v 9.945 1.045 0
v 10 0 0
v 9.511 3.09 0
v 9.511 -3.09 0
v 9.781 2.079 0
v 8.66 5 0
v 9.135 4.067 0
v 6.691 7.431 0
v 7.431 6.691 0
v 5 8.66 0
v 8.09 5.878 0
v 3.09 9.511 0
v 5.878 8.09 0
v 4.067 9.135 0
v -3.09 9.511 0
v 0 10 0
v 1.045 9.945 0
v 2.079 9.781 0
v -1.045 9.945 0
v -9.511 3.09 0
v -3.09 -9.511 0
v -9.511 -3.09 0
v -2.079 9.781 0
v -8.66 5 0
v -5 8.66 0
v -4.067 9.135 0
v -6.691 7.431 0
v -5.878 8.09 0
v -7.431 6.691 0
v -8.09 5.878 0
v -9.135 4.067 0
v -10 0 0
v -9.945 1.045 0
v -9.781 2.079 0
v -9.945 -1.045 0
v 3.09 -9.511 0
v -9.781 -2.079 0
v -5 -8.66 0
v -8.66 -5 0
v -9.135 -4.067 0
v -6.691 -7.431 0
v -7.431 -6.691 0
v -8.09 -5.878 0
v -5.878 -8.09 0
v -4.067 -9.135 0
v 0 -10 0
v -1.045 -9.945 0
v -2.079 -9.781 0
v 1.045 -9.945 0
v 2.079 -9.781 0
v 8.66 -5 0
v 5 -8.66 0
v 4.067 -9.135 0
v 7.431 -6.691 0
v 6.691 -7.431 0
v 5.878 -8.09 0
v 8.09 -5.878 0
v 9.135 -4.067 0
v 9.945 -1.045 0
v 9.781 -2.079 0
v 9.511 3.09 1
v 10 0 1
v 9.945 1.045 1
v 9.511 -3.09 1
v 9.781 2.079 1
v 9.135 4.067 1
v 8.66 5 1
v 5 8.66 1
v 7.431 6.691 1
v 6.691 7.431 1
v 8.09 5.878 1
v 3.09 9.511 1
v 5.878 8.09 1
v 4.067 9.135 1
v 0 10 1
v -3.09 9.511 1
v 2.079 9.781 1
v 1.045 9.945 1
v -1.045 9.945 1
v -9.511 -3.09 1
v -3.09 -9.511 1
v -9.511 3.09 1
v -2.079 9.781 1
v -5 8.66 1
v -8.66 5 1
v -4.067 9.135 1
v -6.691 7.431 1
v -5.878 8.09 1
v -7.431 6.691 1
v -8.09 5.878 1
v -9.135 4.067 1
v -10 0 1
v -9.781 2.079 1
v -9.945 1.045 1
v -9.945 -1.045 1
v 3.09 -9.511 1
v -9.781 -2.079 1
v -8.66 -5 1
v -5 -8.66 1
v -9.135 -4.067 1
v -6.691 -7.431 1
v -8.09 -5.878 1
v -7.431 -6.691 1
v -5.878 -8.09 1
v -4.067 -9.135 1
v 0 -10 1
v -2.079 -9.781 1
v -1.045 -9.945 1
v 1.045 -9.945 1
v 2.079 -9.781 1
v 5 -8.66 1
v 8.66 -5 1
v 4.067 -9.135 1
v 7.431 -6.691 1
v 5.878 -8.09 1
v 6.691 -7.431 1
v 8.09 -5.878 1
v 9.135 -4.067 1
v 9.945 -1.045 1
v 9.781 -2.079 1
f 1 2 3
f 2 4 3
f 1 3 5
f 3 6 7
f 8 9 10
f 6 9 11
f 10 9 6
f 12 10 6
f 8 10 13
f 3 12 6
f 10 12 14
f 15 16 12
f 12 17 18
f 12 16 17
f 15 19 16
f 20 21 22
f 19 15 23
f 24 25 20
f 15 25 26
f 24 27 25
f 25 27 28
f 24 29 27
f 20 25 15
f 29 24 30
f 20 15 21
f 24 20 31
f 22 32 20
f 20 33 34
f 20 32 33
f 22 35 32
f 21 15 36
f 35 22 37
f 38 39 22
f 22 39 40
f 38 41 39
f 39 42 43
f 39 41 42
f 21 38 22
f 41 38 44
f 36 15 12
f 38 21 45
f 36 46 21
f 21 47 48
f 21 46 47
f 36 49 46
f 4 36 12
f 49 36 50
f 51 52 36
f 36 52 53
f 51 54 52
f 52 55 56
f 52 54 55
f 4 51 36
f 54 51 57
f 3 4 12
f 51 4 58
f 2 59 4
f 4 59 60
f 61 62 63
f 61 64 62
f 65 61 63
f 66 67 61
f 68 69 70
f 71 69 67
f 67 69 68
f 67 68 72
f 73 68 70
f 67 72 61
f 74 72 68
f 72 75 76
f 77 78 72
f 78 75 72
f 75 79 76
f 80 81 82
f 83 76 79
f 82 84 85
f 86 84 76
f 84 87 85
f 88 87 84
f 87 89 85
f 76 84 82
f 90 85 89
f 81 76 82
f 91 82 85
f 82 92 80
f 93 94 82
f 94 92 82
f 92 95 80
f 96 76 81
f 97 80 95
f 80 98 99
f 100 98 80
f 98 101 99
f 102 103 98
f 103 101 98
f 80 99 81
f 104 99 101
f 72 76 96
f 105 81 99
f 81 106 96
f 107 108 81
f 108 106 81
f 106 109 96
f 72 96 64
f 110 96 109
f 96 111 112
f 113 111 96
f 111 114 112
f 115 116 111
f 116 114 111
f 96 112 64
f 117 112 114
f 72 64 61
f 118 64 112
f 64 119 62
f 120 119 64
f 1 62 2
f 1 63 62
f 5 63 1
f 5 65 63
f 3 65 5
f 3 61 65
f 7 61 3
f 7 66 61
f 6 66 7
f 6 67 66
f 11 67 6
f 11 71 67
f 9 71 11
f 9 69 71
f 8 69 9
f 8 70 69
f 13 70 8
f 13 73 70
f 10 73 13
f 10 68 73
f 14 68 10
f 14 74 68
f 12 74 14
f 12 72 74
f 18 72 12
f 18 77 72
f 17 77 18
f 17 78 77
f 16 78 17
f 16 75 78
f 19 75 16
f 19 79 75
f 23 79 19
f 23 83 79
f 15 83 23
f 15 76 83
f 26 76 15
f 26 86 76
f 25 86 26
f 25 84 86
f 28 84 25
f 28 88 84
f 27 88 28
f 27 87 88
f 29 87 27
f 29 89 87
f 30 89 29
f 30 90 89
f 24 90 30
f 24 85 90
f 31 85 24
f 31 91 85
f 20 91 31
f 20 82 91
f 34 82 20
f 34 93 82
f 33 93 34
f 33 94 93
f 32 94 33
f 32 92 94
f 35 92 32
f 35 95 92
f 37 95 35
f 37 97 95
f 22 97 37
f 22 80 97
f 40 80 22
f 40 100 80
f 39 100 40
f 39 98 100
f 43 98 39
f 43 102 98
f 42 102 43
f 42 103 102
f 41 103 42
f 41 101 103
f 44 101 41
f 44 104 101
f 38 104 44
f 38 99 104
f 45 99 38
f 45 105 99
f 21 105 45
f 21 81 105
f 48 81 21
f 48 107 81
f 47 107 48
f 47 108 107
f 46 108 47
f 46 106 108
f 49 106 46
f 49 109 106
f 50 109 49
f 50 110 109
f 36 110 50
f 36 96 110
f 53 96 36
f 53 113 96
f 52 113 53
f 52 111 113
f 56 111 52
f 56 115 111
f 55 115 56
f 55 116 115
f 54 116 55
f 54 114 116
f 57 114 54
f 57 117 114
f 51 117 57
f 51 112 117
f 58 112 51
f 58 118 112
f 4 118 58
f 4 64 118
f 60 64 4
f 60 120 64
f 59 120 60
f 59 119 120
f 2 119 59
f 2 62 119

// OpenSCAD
// circle tessellation from $fa / $fs
linear_extrude(1) circle(r = 10, $fa = 6, $fs = 1);
